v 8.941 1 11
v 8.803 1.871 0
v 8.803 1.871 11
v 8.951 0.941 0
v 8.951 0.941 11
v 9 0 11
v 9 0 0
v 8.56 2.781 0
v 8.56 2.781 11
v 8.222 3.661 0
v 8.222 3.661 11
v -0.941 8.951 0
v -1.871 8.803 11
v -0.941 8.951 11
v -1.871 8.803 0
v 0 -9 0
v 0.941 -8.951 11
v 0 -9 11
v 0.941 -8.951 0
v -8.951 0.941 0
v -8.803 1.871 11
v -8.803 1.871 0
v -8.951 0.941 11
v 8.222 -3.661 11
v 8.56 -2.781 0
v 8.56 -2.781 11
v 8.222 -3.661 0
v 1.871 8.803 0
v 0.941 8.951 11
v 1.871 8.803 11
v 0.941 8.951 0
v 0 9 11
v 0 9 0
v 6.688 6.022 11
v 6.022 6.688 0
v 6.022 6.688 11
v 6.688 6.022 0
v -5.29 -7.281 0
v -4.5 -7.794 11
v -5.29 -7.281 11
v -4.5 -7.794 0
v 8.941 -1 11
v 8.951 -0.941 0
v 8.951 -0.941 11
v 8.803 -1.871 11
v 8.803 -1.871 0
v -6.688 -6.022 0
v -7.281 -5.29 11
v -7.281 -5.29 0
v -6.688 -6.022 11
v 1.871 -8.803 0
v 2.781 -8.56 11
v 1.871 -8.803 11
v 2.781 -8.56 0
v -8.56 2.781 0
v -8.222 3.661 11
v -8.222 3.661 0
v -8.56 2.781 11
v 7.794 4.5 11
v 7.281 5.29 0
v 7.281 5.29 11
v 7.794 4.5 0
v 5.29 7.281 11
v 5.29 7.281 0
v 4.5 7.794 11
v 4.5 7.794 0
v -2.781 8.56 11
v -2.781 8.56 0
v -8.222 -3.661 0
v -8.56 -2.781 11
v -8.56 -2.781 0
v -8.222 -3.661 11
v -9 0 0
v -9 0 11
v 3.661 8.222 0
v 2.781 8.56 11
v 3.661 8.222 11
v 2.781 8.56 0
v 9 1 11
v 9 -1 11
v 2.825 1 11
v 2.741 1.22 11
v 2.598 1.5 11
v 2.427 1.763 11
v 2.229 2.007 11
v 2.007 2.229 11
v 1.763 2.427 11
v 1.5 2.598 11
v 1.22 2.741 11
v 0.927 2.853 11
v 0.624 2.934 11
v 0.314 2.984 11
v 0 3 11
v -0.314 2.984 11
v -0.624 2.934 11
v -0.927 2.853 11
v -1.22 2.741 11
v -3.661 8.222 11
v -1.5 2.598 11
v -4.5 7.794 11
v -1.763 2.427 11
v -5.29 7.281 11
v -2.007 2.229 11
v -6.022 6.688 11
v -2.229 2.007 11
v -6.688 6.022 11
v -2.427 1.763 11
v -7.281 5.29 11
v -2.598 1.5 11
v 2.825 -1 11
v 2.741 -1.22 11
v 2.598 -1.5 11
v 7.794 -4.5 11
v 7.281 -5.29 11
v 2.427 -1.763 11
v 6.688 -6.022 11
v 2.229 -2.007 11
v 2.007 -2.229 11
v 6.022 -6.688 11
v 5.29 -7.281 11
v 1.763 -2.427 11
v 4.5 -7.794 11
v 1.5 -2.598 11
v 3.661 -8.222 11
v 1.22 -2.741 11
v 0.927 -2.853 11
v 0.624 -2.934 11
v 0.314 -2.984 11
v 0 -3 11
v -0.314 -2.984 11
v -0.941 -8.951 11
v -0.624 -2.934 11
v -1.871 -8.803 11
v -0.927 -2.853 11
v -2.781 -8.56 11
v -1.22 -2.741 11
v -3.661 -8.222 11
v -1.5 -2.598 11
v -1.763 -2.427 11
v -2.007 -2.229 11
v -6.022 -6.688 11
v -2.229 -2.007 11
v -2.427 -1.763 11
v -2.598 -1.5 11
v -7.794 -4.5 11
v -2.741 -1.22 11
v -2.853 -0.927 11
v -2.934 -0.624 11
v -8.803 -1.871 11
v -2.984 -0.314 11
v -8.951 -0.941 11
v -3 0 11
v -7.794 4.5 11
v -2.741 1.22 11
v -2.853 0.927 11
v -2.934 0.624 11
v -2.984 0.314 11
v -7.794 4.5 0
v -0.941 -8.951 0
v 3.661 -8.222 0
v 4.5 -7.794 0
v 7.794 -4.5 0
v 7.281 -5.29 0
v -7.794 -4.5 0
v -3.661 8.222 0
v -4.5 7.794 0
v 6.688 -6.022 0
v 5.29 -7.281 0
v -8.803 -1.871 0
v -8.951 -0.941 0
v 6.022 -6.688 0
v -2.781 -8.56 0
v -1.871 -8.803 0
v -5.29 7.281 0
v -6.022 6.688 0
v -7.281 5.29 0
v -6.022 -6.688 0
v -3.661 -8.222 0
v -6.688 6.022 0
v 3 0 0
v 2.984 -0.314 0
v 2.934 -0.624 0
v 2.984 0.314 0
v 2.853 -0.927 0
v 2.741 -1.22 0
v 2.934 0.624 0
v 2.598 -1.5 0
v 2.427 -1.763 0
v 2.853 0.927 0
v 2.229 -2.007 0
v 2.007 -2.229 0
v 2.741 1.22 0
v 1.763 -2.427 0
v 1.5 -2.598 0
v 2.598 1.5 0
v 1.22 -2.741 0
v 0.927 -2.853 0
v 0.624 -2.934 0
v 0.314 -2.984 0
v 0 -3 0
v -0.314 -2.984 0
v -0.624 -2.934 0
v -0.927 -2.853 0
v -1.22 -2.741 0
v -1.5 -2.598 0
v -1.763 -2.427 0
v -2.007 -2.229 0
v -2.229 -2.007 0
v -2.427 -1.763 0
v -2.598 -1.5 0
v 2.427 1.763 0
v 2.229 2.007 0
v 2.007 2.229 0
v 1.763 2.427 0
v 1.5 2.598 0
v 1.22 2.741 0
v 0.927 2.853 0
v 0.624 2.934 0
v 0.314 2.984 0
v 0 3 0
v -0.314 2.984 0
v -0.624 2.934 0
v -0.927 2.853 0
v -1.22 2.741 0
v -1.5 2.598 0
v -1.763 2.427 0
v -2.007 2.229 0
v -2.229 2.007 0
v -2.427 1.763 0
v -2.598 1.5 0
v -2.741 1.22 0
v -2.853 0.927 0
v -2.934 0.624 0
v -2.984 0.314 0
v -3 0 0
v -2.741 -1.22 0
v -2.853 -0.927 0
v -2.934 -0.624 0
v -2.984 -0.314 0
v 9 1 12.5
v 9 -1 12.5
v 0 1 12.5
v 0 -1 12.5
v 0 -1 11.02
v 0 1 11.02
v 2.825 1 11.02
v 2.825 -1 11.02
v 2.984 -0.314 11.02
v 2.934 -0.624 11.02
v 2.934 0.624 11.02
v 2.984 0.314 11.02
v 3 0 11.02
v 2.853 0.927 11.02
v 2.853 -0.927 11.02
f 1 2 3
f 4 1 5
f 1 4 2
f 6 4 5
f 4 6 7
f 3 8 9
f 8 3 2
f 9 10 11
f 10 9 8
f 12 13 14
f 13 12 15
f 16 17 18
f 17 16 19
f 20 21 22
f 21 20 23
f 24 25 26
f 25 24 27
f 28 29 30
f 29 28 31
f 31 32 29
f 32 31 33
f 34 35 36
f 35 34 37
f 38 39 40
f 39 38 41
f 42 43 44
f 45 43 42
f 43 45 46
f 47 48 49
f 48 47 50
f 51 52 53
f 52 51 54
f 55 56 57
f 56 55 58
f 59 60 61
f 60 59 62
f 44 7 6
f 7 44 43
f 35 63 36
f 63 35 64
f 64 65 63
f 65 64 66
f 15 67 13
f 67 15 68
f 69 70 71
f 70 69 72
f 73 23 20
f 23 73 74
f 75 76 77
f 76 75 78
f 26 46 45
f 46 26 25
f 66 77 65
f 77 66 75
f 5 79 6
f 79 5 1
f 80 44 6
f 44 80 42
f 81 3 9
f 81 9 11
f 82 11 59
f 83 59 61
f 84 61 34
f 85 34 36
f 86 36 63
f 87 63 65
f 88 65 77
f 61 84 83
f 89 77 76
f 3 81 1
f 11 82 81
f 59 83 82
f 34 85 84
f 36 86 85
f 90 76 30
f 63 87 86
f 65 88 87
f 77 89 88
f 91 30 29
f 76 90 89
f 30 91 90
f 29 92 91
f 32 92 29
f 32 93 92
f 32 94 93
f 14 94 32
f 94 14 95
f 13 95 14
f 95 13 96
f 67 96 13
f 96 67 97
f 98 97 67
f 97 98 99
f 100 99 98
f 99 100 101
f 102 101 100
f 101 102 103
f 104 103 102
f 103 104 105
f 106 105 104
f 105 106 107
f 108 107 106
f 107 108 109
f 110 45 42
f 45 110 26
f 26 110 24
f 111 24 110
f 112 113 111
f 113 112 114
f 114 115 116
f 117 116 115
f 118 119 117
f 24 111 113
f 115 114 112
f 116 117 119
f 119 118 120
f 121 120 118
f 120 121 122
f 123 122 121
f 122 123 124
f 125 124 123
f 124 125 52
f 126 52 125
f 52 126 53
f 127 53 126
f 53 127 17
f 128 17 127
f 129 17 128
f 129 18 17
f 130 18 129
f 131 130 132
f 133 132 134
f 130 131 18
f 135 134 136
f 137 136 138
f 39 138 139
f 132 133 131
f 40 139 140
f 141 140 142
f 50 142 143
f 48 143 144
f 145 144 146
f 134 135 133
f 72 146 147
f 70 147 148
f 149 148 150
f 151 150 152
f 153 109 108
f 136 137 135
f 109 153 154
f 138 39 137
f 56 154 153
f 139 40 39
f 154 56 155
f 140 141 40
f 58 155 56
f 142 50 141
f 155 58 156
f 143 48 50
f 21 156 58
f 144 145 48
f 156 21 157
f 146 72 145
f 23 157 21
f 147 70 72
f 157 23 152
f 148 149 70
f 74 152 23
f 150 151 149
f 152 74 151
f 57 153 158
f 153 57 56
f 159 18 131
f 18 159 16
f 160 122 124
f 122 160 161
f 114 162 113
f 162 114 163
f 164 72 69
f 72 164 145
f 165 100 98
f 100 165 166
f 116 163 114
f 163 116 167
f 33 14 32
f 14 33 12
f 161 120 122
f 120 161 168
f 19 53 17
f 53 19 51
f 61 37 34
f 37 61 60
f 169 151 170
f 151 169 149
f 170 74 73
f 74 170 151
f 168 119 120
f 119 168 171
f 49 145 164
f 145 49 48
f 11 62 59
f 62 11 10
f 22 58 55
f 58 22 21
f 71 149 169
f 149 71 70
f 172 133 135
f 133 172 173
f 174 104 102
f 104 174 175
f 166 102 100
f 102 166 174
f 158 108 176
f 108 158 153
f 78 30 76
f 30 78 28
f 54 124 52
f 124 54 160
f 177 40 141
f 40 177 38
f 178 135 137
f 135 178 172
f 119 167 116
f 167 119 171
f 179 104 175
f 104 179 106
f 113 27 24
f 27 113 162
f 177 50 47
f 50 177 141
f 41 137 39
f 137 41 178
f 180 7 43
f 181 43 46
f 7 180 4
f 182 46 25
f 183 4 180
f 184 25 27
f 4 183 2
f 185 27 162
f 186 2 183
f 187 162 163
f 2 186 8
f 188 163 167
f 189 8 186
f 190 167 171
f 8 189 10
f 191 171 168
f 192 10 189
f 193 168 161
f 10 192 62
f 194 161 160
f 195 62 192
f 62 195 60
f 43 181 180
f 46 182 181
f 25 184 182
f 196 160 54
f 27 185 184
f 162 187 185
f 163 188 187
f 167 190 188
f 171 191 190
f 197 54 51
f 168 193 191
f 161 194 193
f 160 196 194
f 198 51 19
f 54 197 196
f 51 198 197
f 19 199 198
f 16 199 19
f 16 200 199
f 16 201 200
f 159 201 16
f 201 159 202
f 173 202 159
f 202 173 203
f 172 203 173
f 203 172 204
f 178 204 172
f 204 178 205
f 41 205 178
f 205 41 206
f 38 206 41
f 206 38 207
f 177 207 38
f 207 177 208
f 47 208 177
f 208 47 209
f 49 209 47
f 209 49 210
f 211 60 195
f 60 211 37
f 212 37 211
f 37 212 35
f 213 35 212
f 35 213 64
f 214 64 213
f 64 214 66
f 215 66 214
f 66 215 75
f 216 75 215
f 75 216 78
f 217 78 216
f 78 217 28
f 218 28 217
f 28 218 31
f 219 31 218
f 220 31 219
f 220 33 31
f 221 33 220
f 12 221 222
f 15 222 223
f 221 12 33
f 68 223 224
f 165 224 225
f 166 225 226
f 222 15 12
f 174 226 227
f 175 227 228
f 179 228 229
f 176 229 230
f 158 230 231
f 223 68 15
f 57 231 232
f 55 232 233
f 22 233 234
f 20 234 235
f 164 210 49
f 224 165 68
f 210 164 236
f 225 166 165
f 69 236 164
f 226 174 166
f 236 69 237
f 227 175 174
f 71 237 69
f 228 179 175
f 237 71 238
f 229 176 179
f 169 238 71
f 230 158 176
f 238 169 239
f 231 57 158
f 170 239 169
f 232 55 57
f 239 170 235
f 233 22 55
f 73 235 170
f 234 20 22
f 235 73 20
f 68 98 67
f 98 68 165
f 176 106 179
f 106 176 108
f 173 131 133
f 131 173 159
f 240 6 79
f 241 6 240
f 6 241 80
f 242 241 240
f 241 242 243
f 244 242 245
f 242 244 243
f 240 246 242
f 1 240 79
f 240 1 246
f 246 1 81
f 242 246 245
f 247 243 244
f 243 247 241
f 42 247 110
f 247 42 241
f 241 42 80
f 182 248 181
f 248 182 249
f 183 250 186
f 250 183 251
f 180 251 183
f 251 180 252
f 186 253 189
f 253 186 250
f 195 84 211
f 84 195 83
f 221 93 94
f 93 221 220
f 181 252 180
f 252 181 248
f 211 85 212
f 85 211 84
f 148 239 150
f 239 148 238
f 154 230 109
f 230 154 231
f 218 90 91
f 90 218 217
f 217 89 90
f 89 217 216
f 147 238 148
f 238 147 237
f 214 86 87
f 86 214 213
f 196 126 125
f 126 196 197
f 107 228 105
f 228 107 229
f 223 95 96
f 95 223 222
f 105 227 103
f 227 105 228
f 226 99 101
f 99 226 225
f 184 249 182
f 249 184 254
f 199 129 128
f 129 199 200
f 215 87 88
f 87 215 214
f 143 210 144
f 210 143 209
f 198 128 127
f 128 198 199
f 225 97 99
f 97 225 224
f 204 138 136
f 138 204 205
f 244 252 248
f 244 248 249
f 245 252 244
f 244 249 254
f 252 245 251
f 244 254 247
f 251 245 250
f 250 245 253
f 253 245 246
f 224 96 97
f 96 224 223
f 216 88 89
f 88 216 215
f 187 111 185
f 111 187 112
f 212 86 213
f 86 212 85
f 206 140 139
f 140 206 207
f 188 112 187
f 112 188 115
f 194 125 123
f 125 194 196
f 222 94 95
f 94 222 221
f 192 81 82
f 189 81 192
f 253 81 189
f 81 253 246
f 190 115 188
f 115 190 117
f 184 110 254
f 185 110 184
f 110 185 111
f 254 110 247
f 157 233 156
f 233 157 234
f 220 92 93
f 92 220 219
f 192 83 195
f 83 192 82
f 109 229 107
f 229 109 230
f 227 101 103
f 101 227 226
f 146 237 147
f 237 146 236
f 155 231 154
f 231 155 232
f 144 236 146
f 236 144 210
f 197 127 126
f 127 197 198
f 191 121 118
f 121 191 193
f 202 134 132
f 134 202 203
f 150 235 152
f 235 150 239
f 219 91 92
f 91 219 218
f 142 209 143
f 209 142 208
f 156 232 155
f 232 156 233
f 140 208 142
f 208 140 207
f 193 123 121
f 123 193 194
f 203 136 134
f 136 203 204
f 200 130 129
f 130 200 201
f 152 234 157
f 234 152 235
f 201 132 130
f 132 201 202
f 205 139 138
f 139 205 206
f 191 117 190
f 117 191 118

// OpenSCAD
// Pointer control knob.
$fn = 60;
eps = 0.02;
bore_d = 6;
knob_d = 18;
knob_h = 11;
difference() { union() { cylinder(d=knob_d,h=knob_h); translate([0,-1,knob_h]) cube([knob_d/2,2,1.5]); } translate([0,0,-eps]) cylinder(d=bore_d,h=knob_h+2*eps); }
